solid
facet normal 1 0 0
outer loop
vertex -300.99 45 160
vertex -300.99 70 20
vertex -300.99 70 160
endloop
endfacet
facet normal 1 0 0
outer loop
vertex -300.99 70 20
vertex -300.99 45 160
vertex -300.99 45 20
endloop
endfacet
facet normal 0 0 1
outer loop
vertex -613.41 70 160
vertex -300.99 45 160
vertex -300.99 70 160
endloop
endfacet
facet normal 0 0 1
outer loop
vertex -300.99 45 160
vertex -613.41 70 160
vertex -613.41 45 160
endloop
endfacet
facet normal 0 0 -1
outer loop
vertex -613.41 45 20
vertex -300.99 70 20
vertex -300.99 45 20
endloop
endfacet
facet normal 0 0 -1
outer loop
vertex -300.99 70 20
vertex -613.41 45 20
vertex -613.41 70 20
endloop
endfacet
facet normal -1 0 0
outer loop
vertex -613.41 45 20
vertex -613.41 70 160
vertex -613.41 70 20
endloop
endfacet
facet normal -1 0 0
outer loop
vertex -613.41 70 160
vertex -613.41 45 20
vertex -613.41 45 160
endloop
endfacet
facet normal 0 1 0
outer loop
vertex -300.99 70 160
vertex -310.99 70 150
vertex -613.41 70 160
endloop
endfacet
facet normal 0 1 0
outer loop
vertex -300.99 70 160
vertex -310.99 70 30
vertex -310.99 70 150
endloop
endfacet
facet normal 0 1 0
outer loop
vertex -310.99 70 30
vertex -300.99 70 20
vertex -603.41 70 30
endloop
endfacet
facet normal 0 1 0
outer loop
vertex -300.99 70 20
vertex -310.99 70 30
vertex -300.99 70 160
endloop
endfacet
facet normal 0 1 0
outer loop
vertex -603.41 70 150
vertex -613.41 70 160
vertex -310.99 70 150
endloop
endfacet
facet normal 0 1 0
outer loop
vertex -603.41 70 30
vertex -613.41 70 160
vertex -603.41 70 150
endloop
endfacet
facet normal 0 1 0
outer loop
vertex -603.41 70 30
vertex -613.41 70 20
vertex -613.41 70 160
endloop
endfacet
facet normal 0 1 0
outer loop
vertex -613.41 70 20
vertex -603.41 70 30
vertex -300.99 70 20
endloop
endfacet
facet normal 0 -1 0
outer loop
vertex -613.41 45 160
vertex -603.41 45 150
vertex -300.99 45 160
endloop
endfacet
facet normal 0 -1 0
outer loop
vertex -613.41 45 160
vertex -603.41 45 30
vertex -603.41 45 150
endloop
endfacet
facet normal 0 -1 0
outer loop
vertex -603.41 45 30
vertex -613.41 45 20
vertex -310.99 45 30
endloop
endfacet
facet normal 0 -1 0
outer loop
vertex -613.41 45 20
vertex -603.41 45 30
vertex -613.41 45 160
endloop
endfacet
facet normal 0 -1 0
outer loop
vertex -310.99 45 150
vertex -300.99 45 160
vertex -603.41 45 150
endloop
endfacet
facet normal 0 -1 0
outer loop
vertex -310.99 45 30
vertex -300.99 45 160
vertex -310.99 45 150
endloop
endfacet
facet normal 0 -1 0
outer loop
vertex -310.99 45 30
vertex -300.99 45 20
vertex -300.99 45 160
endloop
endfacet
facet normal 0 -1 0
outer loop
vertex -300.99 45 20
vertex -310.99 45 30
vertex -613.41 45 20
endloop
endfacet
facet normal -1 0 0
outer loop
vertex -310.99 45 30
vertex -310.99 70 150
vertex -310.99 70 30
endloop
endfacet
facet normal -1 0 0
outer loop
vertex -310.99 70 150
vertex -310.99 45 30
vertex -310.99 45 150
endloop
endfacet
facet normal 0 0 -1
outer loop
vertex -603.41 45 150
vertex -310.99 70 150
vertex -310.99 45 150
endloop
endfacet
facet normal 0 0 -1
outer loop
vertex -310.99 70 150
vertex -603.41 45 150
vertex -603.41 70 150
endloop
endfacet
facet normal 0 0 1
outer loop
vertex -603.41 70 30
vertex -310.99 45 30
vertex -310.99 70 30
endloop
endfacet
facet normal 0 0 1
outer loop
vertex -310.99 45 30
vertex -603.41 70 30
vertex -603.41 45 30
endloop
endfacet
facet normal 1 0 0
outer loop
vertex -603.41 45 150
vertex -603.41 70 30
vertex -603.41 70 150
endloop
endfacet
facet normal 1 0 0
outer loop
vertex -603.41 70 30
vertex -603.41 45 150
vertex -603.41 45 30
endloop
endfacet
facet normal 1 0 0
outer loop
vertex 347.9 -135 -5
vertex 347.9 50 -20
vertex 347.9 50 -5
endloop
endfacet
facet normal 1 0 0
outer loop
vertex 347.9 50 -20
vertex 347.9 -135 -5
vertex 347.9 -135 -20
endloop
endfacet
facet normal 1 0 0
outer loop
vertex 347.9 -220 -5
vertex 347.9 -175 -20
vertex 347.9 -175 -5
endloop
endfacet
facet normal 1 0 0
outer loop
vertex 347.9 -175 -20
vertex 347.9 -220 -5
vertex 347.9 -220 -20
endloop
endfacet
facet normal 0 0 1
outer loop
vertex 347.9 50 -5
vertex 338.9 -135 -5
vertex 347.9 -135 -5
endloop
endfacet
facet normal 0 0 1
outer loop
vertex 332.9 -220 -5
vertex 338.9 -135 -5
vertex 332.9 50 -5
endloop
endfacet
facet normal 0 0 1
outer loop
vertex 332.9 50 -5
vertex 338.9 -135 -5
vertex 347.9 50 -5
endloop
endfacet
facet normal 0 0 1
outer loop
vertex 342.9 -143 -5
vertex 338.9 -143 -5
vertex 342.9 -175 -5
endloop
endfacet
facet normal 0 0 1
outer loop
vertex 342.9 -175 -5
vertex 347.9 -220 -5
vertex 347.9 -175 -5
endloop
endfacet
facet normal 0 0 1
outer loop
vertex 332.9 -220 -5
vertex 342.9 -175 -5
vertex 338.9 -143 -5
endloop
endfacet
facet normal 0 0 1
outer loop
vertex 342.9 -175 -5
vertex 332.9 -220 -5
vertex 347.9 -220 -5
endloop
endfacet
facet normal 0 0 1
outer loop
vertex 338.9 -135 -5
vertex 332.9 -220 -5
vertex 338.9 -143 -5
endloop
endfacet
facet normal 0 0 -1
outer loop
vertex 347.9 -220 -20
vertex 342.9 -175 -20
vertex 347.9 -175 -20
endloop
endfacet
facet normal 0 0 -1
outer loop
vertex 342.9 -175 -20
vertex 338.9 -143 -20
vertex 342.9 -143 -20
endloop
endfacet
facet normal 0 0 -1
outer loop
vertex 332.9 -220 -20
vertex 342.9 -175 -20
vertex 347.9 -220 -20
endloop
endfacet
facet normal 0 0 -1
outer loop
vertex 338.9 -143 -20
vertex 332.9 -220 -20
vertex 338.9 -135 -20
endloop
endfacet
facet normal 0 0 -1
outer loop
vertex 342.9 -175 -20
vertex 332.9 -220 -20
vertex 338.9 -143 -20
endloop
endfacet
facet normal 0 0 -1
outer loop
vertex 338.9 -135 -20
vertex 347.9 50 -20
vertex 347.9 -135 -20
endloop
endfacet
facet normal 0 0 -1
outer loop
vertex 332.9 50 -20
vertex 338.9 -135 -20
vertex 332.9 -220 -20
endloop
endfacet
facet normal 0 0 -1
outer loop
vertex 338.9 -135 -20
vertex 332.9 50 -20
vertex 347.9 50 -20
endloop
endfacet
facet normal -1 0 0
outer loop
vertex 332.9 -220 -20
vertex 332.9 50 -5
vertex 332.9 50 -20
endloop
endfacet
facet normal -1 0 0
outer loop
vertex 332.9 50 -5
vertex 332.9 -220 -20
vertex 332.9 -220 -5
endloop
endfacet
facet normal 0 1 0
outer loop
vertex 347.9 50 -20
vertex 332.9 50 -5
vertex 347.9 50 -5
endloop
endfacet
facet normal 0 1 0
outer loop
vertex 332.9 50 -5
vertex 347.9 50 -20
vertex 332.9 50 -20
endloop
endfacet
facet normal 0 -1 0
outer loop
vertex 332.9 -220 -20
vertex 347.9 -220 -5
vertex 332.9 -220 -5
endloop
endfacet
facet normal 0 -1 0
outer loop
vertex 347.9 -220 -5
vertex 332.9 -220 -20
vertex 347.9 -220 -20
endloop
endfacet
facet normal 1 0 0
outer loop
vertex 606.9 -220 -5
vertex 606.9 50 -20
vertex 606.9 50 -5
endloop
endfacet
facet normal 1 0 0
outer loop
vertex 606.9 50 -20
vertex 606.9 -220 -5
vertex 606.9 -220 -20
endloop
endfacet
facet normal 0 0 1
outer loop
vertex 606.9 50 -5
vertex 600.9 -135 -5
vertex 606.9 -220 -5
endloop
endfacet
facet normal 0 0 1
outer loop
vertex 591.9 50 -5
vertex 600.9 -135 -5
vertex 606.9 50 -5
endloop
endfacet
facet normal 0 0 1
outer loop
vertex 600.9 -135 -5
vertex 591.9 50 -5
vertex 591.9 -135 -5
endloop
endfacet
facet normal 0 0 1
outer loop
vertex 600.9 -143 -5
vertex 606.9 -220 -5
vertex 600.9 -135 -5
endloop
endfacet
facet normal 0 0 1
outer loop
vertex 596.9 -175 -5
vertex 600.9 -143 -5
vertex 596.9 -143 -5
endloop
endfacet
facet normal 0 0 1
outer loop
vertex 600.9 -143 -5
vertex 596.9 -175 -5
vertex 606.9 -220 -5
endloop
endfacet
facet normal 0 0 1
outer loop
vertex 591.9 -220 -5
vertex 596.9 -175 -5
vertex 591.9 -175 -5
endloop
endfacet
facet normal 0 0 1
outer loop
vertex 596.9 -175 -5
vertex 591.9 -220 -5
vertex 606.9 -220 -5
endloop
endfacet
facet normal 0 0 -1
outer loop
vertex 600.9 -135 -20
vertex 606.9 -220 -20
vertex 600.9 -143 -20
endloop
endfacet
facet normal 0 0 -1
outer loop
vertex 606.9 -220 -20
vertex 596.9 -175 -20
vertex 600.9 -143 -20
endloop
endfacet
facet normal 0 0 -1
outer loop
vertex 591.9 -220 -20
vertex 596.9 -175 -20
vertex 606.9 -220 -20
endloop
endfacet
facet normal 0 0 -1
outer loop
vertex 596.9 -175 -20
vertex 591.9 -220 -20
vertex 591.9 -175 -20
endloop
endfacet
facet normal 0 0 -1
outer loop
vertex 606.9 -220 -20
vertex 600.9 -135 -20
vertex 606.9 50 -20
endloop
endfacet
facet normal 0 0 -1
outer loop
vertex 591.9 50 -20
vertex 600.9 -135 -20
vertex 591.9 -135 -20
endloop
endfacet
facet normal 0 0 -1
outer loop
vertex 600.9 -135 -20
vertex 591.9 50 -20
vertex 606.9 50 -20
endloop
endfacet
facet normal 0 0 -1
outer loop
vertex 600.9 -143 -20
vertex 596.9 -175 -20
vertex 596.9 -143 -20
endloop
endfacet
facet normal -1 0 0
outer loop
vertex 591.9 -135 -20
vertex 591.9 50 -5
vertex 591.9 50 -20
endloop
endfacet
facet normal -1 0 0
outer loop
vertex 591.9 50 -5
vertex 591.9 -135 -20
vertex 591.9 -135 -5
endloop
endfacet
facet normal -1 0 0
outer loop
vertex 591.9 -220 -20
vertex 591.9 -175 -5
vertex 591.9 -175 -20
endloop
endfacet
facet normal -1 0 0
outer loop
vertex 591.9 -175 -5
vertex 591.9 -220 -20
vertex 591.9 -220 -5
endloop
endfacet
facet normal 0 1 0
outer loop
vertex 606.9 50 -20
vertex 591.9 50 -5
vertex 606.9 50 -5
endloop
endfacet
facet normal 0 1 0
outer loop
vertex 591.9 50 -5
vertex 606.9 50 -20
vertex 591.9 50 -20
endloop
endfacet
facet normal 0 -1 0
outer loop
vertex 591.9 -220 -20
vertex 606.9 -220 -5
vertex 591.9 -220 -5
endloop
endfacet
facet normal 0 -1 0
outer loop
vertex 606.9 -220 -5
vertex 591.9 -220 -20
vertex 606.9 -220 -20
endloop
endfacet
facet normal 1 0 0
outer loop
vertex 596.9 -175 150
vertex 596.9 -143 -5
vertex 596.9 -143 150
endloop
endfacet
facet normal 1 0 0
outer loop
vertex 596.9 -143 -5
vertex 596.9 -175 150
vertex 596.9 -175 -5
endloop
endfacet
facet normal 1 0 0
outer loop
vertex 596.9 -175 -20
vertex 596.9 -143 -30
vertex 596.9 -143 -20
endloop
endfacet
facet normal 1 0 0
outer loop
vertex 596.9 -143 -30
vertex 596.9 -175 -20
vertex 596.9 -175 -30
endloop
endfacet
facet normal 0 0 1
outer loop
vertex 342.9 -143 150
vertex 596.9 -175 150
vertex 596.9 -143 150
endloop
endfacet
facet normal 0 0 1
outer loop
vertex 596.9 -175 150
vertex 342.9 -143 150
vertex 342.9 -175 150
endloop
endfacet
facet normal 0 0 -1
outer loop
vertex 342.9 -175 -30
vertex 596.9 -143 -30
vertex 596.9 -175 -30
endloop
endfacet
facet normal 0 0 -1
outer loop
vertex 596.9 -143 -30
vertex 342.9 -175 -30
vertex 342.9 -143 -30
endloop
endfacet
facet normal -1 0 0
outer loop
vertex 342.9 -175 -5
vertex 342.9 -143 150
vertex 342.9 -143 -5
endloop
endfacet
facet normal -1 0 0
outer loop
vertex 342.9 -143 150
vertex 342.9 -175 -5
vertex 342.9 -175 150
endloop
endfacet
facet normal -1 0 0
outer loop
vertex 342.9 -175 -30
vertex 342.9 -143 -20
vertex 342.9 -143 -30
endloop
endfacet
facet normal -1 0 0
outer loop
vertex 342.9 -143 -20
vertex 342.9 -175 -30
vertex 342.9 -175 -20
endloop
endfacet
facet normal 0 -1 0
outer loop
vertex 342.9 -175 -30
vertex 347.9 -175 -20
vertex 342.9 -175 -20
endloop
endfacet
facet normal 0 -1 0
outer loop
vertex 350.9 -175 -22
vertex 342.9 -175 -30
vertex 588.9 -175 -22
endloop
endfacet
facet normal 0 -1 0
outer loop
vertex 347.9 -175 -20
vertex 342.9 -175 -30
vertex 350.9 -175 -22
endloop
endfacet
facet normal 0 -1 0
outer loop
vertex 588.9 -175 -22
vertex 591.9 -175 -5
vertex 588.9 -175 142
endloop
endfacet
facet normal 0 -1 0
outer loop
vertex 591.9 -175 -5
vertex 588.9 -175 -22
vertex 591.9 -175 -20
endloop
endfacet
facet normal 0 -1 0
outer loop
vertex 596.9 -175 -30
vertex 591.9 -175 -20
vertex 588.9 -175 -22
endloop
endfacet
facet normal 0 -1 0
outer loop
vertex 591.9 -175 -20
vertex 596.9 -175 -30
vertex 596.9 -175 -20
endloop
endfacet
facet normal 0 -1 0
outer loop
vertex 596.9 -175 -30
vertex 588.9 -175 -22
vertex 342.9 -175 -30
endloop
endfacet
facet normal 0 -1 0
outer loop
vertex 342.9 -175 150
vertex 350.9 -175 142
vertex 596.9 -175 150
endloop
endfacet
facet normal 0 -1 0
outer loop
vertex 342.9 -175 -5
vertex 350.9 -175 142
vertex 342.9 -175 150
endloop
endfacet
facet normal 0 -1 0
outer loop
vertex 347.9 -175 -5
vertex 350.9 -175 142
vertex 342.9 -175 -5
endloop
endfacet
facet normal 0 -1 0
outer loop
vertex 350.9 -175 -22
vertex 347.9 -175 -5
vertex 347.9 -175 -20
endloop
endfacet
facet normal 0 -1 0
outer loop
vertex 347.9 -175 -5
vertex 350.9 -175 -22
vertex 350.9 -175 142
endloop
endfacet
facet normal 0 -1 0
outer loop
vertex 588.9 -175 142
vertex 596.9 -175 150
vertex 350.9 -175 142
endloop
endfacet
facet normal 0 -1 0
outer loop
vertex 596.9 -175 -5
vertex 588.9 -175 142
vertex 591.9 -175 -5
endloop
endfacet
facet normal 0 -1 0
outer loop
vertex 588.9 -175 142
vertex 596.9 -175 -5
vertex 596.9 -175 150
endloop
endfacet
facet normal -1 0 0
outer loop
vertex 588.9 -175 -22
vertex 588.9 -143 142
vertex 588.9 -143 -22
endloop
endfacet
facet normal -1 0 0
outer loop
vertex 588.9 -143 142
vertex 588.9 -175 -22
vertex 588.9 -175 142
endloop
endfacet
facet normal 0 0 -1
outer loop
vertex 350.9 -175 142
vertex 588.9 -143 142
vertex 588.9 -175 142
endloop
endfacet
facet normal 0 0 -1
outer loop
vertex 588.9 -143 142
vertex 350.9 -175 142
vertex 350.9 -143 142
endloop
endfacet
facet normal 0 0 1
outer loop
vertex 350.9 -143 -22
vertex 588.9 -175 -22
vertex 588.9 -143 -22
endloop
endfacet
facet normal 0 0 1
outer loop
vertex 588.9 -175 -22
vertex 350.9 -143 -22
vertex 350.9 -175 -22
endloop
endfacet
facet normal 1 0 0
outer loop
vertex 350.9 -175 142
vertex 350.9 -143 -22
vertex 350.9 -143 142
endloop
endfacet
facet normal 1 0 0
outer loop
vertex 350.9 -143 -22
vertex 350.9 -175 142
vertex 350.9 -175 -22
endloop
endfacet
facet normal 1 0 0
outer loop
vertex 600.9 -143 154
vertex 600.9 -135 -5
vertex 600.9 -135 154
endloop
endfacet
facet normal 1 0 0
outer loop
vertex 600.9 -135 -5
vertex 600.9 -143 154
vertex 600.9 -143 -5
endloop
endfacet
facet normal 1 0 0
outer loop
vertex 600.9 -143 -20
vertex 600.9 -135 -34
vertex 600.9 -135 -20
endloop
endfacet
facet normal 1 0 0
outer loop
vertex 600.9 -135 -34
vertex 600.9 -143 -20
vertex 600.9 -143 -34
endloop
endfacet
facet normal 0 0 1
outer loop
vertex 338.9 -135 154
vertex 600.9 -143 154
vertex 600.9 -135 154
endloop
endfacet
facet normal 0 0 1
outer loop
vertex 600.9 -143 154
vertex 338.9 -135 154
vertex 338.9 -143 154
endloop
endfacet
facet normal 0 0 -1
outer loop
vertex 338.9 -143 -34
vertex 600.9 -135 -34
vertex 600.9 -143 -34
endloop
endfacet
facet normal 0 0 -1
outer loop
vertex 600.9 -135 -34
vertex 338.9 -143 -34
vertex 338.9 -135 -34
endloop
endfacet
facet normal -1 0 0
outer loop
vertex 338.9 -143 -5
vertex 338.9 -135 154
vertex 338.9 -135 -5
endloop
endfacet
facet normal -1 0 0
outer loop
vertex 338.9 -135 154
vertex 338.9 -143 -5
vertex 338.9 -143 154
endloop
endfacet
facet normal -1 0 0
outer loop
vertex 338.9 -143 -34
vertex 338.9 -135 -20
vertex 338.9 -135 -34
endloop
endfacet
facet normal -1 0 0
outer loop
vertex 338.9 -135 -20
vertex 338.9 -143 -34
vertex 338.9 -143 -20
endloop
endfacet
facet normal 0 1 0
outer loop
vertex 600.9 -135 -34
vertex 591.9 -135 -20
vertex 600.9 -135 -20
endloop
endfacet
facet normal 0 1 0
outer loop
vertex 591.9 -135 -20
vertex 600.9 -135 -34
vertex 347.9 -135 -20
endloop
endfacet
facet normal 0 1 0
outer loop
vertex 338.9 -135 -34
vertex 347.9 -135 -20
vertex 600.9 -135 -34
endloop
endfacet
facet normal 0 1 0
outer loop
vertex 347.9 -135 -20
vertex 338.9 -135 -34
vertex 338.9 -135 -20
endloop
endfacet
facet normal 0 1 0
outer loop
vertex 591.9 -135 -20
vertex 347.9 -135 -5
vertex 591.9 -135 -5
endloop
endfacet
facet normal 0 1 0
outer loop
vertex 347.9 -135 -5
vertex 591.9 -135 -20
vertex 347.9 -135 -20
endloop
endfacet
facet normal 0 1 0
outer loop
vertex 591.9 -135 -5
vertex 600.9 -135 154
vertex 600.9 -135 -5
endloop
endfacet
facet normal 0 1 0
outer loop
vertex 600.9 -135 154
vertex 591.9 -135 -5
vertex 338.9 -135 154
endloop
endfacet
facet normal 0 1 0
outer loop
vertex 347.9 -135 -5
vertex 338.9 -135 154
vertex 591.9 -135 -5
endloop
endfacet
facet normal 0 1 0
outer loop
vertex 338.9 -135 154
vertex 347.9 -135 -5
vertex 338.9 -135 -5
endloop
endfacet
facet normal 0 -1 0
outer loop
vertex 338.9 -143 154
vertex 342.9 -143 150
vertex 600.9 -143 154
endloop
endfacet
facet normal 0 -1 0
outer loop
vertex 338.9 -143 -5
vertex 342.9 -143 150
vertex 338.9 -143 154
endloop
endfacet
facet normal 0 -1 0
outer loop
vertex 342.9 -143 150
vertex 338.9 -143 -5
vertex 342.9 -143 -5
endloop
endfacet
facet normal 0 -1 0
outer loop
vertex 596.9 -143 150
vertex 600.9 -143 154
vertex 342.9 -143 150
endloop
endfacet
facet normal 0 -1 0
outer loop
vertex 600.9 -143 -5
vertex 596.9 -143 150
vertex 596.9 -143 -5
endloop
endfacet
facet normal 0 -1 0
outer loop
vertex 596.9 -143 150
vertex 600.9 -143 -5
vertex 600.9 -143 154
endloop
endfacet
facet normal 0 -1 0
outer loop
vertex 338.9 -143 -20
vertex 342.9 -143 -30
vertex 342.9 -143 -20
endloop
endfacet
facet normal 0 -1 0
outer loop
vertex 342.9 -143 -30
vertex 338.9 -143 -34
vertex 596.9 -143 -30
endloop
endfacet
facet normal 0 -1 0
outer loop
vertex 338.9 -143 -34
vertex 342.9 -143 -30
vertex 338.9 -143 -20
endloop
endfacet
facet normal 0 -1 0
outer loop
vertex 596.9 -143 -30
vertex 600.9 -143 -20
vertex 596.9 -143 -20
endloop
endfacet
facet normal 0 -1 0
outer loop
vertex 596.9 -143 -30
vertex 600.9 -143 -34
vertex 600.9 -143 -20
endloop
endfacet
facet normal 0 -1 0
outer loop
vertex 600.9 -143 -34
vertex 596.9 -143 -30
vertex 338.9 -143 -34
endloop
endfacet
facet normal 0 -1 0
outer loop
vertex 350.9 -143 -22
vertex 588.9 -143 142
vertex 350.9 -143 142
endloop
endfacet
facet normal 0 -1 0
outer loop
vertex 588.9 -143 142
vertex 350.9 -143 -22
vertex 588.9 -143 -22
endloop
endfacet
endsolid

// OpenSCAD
// ====================================================================================
// REVOLUTIONARY TECHNOLOGY COMPANY & UNIVERSITY OF WASHINGTON DEPARTMENT OF PHYSICS
// Subsystem: glovebox_copilot_dash.scad (Motorized Dual-Screen Cockpit Layout)
// Core Objective: Fits standard 1969 dash cluster while extending a co-pilot display
// Center Origin (0,0,0) = Firewall Center point along Steering Axis
// ====================================================================================

$fn = 120; // High-precision CNC milling resolution for dash mounting tabs

// --- Parametric Geometric Boundaries (mm) ---
inch_to_mm         = 25.4;
standard_dash_w    = 54.0 * inch_to_mm; // 1371.6 mm interior cabin cross-width
driver_display_w   = 312.42;            // 12.3" widescreen driver dash monitor (fits standard bezel)
copilot_display_w  = 254.00;            // 10.0" co-pilot display box

// Motorized Drawer Track Slide Offset (0 = Hidden inside glovebox, 220 = Fully Deployed)
GLOVEBOX_DEPLOY_MM = 220.00; 

module driver_dash_cluster() {
    // Primary driver instrumentation shell (Displays Google Maps navigation layers)
    color("DimGrey") {
        translate([-standard_dash_w/3 - driver_display_w/2, 45, 20]) {
            difference() {
                // Main screen enclosure bezel frame
                cube([driver_display_w, 25, 140]);
                // Core viewport display window pane cutout
                translate([10, -1, 10])
                    cube([driver_display_w - 20, 28, 120]);
            }
        }
    }
}

module motorized_glovebox_copilot() {
    // Secondary navigation, engineering tracking, and data routing workstation
    translate([standard_dash_w/4, 45 - GLOVEBOX_DEPLOY_MM, -30]) {
        // Linear roller tracks sliding out from the dashboard framework housing
        color("Silver") {
            translate([-10, -45, 10]) cube([15, GLOVEBOX_DEPLOY_MM + 50, 15]);
            translate([copilot_display_w - 5, -45, 10]) cube([15, GLOVEBOX_DEPLOY_MM + 50, 15]);
        }
        
        // Co-Pilot Multi-Mux Display Shell Assembly
        color("DarkCharcoal") {
            difference() {
                // Main monitor structural housing cube
                cube([copilot_display_w, 35, 180]);
                // Display window screen cutout face
                translate([8, -1, 8])
                    cube([copilot_display_w - 16, 38, 164]);
            }
        }
        
        // OtterBox protective structural overmold back-plate bumper trim
        color("Black")
            translate([-4, 32, -4])
                cube([copilot_display_w + 8, 8, 188]);
    }
}

// --- Composite Display Matrix Instantiation ---
union() {
    driver_dash_cluster();
    motorized_glovebox_copilot();
}
